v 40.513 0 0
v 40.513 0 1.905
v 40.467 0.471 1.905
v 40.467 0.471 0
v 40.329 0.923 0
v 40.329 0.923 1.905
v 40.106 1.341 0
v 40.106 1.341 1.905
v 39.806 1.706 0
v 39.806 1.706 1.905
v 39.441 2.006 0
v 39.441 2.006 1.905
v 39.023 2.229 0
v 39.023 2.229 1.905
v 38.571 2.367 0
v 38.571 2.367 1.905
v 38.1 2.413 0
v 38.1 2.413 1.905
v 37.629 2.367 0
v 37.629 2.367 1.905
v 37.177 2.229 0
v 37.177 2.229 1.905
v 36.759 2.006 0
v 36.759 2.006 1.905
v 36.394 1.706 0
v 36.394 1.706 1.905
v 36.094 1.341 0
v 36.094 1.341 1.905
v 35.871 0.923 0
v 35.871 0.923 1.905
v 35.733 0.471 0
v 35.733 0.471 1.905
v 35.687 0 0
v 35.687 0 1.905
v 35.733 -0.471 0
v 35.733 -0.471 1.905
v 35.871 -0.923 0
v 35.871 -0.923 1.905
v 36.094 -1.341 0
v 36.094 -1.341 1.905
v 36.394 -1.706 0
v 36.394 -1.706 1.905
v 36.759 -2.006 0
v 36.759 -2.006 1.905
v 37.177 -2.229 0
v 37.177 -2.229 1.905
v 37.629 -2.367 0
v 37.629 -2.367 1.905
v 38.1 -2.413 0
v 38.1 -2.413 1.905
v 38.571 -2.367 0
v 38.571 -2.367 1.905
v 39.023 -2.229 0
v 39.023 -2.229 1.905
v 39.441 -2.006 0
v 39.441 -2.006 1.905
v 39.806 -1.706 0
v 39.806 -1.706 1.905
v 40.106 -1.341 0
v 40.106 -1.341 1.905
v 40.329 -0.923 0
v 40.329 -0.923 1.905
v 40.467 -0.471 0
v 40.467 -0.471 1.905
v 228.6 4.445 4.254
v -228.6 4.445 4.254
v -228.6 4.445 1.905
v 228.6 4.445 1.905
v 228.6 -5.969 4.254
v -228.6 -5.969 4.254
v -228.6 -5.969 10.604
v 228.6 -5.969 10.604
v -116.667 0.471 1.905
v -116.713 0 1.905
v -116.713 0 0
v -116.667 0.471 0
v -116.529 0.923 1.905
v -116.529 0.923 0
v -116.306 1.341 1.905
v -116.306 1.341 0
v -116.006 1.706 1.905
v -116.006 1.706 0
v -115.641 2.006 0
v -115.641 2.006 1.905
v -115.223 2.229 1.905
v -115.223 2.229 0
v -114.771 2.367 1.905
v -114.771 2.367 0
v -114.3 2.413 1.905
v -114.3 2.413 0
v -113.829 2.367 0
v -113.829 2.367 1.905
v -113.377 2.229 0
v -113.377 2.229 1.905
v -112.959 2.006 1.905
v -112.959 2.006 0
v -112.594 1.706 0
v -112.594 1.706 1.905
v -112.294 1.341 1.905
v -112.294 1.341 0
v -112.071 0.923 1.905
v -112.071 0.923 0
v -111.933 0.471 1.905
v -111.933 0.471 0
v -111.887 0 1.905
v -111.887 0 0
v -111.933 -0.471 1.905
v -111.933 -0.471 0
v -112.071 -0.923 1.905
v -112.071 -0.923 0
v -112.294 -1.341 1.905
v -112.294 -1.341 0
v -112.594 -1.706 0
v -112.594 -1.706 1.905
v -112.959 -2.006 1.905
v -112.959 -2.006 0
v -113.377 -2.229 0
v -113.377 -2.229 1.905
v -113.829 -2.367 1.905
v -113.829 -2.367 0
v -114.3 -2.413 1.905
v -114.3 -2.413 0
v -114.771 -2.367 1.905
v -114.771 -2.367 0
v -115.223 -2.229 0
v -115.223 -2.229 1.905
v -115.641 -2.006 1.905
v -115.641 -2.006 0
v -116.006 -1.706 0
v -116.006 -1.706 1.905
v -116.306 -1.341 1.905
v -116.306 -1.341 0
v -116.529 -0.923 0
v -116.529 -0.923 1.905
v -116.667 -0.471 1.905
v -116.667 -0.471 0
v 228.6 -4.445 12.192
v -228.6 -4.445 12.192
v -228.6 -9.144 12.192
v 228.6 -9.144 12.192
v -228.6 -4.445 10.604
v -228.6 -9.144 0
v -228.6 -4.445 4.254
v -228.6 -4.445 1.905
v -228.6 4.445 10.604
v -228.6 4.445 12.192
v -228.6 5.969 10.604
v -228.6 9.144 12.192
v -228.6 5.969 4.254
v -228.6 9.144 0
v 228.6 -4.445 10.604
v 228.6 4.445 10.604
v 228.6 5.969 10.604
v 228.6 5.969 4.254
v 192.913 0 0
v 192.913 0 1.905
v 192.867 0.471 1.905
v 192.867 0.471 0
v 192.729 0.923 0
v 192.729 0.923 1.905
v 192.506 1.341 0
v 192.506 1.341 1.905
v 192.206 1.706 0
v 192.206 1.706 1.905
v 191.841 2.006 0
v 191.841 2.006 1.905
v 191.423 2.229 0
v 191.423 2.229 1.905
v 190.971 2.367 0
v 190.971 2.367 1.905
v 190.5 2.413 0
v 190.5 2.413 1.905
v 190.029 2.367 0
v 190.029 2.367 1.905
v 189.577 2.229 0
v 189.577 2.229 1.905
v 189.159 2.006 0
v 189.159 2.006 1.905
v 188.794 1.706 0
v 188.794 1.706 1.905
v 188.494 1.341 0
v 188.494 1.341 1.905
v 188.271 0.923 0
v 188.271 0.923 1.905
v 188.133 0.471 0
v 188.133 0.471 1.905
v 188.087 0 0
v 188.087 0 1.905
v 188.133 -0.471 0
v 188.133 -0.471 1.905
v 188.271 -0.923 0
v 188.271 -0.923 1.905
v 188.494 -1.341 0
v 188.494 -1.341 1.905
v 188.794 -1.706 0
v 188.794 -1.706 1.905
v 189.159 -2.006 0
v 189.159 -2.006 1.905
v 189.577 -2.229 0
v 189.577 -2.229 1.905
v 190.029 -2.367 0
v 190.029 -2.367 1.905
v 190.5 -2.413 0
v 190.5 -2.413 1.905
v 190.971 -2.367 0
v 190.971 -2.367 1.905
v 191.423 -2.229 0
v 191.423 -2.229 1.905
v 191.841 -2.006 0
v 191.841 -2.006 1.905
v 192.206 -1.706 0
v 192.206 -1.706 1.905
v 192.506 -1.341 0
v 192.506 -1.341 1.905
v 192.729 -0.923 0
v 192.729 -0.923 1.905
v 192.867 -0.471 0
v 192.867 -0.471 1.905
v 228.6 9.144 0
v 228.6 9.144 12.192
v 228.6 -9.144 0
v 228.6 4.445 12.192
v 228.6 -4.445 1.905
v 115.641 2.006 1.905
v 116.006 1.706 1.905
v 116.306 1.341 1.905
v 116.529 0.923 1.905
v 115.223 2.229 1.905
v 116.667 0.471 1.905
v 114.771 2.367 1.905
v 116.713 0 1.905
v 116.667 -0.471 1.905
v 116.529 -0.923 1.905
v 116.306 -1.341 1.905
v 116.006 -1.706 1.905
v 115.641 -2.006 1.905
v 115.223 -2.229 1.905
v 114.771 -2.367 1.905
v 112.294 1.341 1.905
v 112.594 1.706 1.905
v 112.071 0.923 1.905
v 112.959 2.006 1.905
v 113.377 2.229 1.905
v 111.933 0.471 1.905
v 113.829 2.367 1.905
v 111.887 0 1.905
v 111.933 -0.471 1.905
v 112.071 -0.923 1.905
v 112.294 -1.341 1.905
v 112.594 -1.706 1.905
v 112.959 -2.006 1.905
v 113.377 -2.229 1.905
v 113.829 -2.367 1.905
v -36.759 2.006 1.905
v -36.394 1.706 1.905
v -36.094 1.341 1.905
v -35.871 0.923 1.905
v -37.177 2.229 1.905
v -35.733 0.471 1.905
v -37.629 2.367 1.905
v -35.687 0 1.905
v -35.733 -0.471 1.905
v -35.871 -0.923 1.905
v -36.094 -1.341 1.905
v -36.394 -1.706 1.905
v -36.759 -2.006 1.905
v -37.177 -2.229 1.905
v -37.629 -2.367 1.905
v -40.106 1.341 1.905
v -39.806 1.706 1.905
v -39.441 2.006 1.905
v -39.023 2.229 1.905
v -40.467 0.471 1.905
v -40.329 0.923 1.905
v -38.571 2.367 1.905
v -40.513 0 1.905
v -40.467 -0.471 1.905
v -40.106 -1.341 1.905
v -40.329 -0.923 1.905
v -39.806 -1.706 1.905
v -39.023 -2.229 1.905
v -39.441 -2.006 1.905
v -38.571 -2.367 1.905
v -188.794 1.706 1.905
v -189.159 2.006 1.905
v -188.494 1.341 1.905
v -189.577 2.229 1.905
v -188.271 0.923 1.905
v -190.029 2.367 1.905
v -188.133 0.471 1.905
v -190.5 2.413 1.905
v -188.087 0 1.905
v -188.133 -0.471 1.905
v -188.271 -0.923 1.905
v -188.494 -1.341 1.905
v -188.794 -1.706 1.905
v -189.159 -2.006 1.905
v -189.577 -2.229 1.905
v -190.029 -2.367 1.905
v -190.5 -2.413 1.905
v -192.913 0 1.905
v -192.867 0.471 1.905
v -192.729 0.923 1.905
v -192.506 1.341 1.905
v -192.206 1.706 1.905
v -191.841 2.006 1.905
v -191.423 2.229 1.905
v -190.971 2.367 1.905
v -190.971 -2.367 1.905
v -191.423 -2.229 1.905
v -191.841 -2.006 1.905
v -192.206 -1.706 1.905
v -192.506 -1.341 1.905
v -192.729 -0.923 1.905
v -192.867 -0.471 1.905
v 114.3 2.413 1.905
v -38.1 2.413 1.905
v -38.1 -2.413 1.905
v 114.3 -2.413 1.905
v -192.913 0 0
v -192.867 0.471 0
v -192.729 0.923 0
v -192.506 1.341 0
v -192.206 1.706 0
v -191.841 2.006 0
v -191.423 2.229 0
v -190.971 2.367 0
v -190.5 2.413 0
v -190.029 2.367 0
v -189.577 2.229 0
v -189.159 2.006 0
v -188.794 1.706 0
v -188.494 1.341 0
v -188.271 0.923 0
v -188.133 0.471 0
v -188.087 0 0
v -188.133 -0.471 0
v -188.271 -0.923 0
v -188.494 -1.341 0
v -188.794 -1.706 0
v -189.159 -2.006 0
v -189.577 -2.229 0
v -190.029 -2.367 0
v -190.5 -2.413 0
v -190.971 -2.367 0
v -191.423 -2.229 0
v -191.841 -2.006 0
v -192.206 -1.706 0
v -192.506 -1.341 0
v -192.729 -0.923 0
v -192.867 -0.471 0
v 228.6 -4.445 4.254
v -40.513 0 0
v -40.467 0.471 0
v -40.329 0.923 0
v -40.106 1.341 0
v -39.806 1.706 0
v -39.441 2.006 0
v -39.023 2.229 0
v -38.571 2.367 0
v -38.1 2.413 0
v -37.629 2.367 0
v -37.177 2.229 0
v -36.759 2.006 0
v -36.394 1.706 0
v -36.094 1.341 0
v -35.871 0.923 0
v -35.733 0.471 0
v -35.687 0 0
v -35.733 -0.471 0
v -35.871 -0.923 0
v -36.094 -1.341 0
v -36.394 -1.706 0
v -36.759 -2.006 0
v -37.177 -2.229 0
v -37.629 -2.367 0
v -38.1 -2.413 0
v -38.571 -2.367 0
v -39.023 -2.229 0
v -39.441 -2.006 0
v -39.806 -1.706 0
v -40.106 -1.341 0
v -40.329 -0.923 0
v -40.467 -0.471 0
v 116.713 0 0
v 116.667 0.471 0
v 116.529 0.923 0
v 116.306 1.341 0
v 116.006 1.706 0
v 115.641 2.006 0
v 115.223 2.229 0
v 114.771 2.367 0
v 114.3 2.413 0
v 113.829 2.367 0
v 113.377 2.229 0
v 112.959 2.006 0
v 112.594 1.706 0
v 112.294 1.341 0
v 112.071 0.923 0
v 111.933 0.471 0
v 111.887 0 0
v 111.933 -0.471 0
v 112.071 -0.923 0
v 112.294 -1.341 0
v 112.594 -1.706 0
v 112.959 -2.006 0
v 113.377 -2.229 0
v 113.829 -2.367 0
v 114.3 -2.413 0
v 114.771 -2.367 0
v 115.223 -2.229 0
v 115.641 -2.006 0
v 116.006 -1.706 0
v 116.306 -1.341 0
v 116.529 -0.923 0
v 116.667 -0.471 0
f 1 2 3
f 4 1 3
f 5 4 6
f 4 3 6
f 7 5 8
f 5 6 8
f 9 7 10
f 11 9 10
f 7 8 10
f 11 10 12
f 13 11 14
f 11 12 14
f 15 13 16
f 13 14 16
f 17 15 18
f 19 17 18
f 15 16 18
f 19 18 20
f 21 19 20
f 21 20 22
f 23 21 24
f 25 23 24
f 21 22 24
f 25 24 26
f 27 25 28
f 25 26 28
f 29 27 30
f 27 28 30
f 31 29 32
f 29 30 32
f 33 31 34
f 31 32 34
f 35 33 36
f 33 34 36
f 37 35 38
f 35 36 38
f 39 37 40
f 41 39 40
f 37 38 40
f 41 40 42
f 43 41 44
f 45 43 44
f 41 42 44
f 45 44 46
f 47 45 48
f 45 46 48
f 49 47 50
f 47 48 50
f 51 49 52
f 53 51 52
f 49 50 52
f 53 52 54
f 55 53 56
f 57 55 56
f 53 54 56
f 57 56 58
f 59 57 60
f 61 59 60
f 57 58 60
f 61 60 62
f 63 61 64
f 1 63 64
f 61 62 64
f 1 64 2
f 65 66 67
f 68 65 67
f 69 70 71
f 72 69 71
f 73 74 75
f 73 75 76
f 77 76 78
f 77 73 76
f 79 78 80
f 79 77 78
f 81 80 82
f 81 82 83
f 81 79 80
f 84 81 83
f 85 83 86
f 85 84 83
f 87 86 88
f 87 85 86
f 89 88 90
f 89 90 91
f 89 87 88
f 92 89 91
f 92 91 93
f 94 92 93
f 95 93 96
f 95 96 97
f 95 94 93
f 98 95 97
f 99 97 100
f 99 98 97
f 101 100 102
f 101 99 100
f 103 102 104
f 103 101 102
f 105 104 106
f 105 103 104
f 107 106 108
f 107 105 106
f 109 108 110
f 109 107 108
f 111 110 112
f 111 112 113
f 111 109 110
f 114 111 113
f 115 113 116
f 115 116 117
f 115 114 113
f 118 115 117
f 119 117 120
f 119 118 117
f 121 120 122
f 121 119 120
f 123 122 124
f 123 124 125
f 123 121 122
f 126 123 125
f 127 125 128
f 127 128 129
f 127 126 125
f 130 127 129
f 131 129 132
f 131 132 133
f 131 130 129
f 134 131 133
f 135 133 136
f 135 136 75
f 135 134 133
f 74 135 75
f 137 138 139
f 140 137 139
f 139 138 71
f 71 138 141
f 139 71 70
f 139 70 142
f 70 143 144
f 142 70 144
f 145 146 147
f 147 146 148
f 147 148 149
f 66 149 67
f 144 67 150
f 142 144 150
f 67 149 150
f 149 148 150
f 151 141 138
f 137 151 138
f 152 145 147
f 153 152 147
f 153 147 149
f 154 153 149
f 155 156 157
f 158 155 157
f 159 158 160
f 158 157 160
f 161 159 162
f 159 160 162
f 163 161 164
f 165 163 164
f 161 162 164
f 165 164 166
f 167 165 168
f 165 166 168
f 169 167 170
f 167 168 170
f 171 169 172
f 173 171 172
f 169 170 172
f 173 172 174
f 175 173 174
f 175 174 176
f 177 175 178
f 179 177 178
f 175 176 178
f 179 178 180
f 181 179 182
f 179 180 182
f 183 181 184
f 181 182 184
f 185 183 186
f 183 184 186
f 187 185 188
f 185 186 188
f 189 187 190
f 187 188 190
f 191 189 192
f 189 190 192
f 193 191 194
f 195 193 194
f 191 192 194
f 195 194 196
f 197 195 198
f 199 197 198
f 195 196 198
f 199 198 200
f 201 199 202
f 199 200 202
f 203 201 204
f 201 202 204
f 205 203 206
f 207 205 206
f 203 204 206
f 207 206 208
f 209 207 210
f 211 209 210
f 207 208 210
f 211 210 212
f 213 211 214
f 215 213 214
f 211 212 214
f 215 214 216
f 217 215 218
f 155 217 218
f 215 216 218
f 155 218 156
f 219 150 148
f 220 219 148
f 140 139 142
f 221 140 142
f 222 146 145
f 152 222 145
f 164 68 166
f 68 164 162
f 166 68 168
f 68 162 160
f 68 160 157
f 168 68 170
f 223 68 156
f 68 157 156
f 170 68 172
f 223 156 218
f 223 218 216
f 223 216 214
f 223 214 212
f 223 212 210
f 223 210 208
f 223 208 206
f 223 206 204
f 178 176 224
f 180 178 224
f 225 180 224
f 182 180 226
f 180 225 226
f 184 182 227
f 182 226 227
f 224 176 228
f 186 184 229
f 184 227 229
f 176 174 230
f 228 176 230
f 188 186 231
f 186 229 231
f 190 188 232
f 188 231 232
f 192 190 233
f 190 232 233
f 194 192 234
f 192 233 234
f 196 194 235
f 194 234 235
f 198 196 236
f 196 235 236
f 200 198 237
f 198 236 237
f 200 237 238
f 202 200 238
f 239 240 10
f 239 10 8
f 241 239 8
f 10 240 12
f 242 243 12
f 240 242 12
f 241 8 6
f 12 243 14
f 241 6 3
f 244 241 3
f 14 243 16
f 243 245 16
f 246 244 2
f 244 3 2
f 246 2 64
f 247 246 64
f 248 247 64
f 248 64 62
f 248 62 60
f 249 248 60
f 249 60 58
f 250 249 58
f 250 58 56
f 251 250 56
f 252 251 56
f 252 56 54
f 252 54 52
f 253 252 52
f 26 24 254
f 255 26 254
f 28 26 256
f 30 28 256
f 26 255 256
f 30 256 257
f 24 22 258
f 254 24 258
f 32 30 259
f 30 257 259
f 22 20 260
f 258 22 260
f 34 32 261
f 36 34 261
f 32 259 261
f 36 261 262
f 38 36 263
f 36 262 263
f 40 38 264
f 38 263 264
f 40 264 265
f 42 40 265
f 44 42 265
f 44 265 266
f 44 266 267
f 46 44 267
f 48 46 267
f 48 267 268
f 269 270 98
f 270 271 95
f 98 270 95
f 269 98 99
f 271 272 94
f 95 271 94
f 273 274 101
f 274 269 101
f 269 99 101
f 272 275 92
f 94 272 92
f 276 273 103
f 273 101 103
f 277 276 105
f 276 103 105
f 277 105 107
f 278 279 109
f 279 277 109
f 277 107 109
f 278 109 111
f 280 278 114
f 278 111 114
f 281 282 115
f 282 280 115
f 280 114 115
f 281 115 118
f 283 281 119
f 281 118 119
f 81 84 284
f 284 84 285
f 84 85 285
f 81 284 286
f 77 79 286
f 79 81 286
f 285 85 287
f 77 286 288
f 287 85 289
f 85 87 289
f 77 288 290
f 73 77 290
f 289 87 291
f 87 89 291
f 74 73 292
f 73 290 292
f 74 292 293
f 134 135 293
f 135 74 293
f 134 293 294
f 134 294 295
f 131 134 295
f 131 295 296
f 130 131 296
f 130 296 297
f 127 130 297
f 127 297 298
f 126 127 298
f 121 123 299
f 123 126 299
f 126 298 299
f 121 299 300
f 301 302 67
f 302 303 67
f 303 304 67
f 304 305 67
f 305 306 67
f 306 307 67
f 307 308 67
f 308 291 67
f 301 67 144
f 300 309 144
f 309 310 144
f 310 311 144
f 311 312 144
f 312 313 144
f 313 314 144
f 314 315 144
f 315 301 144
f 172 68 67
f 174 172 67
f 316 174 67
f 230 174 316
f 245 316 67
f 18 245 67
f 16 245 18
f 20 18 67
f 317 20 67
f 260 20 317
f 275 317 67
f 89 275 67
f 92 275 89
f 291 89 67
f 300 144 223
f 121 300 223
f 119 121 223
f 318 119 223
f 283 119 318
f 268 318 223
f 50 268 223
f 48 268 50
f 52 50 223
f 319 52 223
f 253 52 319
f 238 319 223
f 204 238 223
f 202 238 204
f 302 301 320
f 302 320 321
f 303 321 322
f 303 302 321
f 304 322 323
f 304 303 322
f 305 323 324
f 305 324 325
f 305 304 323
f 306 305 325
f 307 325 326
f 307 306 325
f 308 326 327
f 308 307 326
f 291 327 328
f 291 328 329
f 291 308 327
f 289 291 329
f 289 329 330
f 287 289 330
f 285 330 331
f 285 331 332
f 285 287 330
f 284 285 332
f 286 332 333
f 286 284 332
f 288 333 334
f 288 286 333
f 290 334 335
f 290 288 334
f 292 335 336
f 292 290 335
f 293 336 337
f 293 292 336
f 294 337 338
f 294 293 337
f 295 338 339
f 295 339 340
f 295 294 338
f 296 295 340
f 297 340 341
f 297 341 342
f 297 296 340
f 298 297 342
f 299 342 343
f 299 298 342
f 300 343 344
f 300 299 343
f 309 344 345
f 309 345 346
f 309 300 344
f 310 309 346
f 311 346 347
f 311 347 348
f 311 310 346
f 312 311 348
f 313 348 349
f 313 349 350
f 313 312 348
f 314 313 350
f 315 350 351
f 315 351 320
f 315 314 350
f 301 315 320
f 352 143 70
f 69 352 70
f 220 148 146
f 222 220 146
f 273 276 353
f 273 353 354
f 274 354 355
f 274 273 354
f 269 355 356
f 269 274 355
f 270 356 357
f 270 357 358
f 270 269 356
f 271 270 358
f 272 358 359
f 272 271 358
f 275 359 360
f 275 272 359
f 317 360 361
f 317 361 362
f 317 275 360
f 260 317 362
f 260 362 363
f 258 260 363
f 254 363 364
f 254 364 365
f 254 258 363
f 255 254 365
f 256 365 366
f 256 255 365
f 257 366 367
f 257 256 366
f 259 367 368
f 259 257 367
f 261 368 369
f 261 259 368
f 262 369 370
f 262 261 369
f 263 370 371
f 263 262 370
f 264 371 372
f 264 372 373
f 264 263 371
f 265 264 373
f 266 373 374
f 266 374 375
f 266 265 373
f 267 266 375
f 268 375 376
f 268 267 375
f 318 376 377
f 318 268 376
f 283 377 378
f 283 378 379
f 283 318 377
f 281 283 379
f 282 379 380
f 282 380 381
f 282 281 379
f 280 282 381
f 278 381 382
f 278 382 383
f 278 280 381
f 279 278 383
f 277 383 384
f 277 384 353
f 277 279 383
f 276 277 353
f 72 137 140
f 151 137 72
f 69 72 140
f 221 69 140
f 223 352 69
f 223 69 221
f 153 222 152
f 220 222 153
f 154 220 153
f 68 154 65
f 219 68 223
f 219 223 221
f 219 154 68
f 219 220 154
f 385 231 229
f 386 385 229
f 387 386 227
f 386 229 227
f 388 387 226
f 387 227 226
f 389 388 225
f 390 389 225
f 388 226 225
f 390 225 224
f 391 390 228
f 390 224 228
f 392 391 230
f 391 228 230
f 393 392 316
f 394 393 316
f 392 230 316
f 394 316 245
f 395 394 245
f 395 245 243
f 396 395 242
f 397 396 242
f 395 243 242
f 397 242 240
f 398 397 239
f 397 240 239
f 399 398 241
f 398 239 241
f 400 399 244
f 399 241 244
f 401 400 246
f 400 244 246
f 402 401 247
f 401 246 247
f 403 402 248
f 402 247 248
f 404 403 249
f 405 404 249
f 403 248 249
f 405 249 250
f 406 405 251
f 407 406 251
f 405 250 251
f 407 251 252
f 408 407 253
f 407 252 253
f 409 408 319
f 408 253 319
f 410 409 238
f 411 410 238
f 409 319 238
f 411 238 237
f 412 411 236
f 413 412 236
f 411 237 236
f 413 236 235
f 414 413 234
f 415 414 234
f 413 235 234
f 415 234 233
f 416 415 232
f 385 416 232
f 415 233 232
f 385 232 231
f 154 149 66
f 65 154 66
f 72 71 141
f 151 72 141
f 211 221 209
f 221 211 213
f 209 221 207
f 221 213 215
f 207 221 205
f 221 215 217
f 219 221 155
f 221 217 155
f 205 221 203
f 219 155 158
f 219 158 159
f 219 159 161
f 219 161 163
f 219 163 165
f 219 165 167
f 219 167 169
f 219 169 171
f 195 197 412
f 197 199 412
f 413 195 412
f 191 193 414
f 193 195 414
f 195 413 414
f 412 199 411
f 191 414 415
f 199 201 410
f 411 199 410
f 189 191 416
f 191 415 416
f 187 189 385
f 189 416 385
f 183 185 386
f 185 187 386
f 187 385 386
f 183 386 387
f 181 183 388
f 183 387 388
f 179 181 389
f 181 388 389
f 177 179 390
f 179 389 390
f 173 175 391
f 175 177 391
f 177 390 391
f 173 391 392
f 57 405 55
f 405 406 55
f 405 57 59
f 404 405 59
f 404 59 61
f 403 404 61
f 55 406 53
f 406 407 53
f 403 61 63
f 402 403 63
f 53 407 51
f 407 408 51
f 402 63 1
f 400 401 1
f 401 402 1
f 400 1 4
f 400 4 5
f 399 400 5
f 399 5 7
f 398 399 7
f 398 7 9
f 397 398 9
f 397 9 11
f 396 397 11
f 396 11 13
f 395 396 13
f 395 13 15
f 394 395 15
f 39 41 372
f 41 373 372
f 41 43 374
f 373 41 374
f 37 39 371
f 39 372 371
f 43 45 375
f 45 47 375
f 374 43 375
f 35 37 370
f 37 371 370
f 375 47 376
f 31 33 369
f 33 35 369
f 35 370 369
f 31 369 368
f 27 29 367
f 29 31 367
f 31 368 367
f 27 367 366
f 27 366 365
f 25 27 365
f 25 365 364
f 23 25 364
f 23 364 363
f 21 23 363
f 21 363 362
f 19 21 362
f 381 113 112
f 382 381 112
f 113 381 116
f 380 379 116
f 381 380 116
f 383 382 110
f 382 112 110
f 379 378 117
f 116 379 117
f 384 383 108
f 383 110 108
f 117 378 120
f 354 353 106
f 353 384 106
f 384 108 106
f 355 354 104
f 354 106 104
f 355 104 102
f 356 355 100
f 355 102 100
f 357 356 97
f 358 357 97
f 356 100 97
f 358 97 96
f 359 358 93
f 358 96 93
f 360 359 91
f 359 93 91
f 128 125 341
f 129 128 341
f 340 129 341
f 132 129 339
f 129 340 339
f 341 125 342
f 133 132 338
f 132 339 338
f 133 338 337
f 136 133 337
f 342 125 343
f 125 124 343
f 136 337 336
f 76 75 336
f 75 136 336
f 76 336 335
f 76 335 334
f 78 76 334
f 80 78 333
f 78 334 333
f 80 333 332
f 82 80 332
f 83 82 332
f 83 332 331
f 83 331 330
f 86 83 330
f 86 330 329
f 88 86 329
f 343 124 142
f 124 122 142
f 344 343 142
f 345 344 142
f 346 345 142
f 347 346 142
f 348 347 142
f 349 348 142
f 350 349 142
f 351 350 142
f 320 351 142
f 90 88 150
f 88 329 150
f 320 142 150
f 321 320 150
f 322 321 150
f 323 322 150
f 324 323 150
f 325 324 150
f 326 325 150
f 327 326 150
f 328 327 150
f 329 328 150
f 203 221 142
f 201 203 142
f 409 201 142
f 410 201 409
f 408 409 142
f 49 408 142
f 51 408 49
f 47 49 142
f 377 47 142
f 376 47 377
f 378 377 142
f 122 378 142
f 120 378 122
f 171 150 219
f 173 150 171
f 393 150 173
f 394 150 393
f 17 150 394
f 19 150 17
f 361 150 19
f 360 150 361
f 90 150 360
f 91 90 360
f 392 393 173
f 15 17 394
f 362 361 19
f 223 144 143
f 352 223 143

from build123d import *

# Parameters (mm, degrees)
BOSS_EXTRUDE1_DEPTH = 228.6
SKETCH3_R           = 2.413
CUT_EXTRUDE1_DEPTH  = 1.905
LPATTERN1_COUNT     = 3
LPATTERN1_PITCH     = 76.2


with BuildPart() as part:
    # Sketch2 → Boss-Extrude1 (new, symmetric)
    with BuildSketch(Plane(origin=(0, 0, 0), x_dir=(0, 0, -1), z_dir=(1, 0, 0))):
        Polygon((0, 9.144), (-12.192, 9.144), (-12.192, 4.445), (-10.6045, 4.445), (-10.6045, 5.969), (-4.2545, 5.969), (-4.2545, 4.445), (-1.905, 4.445), (-1.905, -4.445), (-4.2545, -4.445), (-4.2545, -5.969), (-10.6045, -5.969), (-10.6045, -4.445), (-12.192, -4.445), (-12.192, -9.144), (0, -9.144), align=None)
    extrude(amount=BOSS_EXTRUDE1_DEPTH, both=True)

    # Sketch3 → Cut-Extrude1 (cut)
    with BuildSketch(Plane.XY.offset(1.905)):
        with Locations((38.1, 0)):
            Circle(SKETCH3_R)
    cut_extrude1 = extrude(amount=-CUT_EXTRUDE1_DEPTH, mode=Mode.SUBTRACT)

    # LPattern1: Cut-Extrude1 ×3
    with Locations(*[(i * LPATTERN1_PITCH, 0, 0) for i in range(1, LPATTERN1_COUNT)]):
        add(cut_extrude1, mode=Mode.SUBTRACT)

    # SurfaceCut1
    split(bisect_by=Plane(origin=(0, 0, 0), x_dir=(0, 0, -1), z_dir=(1, 0, 0)), keep=Keep.TOP)

    # Mirror1: part across plane


with BuildPart() as part_1:
    add(part.part)
    add(part.part.mirror(Plane(origin=(0, 0, 0), x_dir=(0, 0, 1), z_dir=(1, 0, 0))))


solid = part_1.part
